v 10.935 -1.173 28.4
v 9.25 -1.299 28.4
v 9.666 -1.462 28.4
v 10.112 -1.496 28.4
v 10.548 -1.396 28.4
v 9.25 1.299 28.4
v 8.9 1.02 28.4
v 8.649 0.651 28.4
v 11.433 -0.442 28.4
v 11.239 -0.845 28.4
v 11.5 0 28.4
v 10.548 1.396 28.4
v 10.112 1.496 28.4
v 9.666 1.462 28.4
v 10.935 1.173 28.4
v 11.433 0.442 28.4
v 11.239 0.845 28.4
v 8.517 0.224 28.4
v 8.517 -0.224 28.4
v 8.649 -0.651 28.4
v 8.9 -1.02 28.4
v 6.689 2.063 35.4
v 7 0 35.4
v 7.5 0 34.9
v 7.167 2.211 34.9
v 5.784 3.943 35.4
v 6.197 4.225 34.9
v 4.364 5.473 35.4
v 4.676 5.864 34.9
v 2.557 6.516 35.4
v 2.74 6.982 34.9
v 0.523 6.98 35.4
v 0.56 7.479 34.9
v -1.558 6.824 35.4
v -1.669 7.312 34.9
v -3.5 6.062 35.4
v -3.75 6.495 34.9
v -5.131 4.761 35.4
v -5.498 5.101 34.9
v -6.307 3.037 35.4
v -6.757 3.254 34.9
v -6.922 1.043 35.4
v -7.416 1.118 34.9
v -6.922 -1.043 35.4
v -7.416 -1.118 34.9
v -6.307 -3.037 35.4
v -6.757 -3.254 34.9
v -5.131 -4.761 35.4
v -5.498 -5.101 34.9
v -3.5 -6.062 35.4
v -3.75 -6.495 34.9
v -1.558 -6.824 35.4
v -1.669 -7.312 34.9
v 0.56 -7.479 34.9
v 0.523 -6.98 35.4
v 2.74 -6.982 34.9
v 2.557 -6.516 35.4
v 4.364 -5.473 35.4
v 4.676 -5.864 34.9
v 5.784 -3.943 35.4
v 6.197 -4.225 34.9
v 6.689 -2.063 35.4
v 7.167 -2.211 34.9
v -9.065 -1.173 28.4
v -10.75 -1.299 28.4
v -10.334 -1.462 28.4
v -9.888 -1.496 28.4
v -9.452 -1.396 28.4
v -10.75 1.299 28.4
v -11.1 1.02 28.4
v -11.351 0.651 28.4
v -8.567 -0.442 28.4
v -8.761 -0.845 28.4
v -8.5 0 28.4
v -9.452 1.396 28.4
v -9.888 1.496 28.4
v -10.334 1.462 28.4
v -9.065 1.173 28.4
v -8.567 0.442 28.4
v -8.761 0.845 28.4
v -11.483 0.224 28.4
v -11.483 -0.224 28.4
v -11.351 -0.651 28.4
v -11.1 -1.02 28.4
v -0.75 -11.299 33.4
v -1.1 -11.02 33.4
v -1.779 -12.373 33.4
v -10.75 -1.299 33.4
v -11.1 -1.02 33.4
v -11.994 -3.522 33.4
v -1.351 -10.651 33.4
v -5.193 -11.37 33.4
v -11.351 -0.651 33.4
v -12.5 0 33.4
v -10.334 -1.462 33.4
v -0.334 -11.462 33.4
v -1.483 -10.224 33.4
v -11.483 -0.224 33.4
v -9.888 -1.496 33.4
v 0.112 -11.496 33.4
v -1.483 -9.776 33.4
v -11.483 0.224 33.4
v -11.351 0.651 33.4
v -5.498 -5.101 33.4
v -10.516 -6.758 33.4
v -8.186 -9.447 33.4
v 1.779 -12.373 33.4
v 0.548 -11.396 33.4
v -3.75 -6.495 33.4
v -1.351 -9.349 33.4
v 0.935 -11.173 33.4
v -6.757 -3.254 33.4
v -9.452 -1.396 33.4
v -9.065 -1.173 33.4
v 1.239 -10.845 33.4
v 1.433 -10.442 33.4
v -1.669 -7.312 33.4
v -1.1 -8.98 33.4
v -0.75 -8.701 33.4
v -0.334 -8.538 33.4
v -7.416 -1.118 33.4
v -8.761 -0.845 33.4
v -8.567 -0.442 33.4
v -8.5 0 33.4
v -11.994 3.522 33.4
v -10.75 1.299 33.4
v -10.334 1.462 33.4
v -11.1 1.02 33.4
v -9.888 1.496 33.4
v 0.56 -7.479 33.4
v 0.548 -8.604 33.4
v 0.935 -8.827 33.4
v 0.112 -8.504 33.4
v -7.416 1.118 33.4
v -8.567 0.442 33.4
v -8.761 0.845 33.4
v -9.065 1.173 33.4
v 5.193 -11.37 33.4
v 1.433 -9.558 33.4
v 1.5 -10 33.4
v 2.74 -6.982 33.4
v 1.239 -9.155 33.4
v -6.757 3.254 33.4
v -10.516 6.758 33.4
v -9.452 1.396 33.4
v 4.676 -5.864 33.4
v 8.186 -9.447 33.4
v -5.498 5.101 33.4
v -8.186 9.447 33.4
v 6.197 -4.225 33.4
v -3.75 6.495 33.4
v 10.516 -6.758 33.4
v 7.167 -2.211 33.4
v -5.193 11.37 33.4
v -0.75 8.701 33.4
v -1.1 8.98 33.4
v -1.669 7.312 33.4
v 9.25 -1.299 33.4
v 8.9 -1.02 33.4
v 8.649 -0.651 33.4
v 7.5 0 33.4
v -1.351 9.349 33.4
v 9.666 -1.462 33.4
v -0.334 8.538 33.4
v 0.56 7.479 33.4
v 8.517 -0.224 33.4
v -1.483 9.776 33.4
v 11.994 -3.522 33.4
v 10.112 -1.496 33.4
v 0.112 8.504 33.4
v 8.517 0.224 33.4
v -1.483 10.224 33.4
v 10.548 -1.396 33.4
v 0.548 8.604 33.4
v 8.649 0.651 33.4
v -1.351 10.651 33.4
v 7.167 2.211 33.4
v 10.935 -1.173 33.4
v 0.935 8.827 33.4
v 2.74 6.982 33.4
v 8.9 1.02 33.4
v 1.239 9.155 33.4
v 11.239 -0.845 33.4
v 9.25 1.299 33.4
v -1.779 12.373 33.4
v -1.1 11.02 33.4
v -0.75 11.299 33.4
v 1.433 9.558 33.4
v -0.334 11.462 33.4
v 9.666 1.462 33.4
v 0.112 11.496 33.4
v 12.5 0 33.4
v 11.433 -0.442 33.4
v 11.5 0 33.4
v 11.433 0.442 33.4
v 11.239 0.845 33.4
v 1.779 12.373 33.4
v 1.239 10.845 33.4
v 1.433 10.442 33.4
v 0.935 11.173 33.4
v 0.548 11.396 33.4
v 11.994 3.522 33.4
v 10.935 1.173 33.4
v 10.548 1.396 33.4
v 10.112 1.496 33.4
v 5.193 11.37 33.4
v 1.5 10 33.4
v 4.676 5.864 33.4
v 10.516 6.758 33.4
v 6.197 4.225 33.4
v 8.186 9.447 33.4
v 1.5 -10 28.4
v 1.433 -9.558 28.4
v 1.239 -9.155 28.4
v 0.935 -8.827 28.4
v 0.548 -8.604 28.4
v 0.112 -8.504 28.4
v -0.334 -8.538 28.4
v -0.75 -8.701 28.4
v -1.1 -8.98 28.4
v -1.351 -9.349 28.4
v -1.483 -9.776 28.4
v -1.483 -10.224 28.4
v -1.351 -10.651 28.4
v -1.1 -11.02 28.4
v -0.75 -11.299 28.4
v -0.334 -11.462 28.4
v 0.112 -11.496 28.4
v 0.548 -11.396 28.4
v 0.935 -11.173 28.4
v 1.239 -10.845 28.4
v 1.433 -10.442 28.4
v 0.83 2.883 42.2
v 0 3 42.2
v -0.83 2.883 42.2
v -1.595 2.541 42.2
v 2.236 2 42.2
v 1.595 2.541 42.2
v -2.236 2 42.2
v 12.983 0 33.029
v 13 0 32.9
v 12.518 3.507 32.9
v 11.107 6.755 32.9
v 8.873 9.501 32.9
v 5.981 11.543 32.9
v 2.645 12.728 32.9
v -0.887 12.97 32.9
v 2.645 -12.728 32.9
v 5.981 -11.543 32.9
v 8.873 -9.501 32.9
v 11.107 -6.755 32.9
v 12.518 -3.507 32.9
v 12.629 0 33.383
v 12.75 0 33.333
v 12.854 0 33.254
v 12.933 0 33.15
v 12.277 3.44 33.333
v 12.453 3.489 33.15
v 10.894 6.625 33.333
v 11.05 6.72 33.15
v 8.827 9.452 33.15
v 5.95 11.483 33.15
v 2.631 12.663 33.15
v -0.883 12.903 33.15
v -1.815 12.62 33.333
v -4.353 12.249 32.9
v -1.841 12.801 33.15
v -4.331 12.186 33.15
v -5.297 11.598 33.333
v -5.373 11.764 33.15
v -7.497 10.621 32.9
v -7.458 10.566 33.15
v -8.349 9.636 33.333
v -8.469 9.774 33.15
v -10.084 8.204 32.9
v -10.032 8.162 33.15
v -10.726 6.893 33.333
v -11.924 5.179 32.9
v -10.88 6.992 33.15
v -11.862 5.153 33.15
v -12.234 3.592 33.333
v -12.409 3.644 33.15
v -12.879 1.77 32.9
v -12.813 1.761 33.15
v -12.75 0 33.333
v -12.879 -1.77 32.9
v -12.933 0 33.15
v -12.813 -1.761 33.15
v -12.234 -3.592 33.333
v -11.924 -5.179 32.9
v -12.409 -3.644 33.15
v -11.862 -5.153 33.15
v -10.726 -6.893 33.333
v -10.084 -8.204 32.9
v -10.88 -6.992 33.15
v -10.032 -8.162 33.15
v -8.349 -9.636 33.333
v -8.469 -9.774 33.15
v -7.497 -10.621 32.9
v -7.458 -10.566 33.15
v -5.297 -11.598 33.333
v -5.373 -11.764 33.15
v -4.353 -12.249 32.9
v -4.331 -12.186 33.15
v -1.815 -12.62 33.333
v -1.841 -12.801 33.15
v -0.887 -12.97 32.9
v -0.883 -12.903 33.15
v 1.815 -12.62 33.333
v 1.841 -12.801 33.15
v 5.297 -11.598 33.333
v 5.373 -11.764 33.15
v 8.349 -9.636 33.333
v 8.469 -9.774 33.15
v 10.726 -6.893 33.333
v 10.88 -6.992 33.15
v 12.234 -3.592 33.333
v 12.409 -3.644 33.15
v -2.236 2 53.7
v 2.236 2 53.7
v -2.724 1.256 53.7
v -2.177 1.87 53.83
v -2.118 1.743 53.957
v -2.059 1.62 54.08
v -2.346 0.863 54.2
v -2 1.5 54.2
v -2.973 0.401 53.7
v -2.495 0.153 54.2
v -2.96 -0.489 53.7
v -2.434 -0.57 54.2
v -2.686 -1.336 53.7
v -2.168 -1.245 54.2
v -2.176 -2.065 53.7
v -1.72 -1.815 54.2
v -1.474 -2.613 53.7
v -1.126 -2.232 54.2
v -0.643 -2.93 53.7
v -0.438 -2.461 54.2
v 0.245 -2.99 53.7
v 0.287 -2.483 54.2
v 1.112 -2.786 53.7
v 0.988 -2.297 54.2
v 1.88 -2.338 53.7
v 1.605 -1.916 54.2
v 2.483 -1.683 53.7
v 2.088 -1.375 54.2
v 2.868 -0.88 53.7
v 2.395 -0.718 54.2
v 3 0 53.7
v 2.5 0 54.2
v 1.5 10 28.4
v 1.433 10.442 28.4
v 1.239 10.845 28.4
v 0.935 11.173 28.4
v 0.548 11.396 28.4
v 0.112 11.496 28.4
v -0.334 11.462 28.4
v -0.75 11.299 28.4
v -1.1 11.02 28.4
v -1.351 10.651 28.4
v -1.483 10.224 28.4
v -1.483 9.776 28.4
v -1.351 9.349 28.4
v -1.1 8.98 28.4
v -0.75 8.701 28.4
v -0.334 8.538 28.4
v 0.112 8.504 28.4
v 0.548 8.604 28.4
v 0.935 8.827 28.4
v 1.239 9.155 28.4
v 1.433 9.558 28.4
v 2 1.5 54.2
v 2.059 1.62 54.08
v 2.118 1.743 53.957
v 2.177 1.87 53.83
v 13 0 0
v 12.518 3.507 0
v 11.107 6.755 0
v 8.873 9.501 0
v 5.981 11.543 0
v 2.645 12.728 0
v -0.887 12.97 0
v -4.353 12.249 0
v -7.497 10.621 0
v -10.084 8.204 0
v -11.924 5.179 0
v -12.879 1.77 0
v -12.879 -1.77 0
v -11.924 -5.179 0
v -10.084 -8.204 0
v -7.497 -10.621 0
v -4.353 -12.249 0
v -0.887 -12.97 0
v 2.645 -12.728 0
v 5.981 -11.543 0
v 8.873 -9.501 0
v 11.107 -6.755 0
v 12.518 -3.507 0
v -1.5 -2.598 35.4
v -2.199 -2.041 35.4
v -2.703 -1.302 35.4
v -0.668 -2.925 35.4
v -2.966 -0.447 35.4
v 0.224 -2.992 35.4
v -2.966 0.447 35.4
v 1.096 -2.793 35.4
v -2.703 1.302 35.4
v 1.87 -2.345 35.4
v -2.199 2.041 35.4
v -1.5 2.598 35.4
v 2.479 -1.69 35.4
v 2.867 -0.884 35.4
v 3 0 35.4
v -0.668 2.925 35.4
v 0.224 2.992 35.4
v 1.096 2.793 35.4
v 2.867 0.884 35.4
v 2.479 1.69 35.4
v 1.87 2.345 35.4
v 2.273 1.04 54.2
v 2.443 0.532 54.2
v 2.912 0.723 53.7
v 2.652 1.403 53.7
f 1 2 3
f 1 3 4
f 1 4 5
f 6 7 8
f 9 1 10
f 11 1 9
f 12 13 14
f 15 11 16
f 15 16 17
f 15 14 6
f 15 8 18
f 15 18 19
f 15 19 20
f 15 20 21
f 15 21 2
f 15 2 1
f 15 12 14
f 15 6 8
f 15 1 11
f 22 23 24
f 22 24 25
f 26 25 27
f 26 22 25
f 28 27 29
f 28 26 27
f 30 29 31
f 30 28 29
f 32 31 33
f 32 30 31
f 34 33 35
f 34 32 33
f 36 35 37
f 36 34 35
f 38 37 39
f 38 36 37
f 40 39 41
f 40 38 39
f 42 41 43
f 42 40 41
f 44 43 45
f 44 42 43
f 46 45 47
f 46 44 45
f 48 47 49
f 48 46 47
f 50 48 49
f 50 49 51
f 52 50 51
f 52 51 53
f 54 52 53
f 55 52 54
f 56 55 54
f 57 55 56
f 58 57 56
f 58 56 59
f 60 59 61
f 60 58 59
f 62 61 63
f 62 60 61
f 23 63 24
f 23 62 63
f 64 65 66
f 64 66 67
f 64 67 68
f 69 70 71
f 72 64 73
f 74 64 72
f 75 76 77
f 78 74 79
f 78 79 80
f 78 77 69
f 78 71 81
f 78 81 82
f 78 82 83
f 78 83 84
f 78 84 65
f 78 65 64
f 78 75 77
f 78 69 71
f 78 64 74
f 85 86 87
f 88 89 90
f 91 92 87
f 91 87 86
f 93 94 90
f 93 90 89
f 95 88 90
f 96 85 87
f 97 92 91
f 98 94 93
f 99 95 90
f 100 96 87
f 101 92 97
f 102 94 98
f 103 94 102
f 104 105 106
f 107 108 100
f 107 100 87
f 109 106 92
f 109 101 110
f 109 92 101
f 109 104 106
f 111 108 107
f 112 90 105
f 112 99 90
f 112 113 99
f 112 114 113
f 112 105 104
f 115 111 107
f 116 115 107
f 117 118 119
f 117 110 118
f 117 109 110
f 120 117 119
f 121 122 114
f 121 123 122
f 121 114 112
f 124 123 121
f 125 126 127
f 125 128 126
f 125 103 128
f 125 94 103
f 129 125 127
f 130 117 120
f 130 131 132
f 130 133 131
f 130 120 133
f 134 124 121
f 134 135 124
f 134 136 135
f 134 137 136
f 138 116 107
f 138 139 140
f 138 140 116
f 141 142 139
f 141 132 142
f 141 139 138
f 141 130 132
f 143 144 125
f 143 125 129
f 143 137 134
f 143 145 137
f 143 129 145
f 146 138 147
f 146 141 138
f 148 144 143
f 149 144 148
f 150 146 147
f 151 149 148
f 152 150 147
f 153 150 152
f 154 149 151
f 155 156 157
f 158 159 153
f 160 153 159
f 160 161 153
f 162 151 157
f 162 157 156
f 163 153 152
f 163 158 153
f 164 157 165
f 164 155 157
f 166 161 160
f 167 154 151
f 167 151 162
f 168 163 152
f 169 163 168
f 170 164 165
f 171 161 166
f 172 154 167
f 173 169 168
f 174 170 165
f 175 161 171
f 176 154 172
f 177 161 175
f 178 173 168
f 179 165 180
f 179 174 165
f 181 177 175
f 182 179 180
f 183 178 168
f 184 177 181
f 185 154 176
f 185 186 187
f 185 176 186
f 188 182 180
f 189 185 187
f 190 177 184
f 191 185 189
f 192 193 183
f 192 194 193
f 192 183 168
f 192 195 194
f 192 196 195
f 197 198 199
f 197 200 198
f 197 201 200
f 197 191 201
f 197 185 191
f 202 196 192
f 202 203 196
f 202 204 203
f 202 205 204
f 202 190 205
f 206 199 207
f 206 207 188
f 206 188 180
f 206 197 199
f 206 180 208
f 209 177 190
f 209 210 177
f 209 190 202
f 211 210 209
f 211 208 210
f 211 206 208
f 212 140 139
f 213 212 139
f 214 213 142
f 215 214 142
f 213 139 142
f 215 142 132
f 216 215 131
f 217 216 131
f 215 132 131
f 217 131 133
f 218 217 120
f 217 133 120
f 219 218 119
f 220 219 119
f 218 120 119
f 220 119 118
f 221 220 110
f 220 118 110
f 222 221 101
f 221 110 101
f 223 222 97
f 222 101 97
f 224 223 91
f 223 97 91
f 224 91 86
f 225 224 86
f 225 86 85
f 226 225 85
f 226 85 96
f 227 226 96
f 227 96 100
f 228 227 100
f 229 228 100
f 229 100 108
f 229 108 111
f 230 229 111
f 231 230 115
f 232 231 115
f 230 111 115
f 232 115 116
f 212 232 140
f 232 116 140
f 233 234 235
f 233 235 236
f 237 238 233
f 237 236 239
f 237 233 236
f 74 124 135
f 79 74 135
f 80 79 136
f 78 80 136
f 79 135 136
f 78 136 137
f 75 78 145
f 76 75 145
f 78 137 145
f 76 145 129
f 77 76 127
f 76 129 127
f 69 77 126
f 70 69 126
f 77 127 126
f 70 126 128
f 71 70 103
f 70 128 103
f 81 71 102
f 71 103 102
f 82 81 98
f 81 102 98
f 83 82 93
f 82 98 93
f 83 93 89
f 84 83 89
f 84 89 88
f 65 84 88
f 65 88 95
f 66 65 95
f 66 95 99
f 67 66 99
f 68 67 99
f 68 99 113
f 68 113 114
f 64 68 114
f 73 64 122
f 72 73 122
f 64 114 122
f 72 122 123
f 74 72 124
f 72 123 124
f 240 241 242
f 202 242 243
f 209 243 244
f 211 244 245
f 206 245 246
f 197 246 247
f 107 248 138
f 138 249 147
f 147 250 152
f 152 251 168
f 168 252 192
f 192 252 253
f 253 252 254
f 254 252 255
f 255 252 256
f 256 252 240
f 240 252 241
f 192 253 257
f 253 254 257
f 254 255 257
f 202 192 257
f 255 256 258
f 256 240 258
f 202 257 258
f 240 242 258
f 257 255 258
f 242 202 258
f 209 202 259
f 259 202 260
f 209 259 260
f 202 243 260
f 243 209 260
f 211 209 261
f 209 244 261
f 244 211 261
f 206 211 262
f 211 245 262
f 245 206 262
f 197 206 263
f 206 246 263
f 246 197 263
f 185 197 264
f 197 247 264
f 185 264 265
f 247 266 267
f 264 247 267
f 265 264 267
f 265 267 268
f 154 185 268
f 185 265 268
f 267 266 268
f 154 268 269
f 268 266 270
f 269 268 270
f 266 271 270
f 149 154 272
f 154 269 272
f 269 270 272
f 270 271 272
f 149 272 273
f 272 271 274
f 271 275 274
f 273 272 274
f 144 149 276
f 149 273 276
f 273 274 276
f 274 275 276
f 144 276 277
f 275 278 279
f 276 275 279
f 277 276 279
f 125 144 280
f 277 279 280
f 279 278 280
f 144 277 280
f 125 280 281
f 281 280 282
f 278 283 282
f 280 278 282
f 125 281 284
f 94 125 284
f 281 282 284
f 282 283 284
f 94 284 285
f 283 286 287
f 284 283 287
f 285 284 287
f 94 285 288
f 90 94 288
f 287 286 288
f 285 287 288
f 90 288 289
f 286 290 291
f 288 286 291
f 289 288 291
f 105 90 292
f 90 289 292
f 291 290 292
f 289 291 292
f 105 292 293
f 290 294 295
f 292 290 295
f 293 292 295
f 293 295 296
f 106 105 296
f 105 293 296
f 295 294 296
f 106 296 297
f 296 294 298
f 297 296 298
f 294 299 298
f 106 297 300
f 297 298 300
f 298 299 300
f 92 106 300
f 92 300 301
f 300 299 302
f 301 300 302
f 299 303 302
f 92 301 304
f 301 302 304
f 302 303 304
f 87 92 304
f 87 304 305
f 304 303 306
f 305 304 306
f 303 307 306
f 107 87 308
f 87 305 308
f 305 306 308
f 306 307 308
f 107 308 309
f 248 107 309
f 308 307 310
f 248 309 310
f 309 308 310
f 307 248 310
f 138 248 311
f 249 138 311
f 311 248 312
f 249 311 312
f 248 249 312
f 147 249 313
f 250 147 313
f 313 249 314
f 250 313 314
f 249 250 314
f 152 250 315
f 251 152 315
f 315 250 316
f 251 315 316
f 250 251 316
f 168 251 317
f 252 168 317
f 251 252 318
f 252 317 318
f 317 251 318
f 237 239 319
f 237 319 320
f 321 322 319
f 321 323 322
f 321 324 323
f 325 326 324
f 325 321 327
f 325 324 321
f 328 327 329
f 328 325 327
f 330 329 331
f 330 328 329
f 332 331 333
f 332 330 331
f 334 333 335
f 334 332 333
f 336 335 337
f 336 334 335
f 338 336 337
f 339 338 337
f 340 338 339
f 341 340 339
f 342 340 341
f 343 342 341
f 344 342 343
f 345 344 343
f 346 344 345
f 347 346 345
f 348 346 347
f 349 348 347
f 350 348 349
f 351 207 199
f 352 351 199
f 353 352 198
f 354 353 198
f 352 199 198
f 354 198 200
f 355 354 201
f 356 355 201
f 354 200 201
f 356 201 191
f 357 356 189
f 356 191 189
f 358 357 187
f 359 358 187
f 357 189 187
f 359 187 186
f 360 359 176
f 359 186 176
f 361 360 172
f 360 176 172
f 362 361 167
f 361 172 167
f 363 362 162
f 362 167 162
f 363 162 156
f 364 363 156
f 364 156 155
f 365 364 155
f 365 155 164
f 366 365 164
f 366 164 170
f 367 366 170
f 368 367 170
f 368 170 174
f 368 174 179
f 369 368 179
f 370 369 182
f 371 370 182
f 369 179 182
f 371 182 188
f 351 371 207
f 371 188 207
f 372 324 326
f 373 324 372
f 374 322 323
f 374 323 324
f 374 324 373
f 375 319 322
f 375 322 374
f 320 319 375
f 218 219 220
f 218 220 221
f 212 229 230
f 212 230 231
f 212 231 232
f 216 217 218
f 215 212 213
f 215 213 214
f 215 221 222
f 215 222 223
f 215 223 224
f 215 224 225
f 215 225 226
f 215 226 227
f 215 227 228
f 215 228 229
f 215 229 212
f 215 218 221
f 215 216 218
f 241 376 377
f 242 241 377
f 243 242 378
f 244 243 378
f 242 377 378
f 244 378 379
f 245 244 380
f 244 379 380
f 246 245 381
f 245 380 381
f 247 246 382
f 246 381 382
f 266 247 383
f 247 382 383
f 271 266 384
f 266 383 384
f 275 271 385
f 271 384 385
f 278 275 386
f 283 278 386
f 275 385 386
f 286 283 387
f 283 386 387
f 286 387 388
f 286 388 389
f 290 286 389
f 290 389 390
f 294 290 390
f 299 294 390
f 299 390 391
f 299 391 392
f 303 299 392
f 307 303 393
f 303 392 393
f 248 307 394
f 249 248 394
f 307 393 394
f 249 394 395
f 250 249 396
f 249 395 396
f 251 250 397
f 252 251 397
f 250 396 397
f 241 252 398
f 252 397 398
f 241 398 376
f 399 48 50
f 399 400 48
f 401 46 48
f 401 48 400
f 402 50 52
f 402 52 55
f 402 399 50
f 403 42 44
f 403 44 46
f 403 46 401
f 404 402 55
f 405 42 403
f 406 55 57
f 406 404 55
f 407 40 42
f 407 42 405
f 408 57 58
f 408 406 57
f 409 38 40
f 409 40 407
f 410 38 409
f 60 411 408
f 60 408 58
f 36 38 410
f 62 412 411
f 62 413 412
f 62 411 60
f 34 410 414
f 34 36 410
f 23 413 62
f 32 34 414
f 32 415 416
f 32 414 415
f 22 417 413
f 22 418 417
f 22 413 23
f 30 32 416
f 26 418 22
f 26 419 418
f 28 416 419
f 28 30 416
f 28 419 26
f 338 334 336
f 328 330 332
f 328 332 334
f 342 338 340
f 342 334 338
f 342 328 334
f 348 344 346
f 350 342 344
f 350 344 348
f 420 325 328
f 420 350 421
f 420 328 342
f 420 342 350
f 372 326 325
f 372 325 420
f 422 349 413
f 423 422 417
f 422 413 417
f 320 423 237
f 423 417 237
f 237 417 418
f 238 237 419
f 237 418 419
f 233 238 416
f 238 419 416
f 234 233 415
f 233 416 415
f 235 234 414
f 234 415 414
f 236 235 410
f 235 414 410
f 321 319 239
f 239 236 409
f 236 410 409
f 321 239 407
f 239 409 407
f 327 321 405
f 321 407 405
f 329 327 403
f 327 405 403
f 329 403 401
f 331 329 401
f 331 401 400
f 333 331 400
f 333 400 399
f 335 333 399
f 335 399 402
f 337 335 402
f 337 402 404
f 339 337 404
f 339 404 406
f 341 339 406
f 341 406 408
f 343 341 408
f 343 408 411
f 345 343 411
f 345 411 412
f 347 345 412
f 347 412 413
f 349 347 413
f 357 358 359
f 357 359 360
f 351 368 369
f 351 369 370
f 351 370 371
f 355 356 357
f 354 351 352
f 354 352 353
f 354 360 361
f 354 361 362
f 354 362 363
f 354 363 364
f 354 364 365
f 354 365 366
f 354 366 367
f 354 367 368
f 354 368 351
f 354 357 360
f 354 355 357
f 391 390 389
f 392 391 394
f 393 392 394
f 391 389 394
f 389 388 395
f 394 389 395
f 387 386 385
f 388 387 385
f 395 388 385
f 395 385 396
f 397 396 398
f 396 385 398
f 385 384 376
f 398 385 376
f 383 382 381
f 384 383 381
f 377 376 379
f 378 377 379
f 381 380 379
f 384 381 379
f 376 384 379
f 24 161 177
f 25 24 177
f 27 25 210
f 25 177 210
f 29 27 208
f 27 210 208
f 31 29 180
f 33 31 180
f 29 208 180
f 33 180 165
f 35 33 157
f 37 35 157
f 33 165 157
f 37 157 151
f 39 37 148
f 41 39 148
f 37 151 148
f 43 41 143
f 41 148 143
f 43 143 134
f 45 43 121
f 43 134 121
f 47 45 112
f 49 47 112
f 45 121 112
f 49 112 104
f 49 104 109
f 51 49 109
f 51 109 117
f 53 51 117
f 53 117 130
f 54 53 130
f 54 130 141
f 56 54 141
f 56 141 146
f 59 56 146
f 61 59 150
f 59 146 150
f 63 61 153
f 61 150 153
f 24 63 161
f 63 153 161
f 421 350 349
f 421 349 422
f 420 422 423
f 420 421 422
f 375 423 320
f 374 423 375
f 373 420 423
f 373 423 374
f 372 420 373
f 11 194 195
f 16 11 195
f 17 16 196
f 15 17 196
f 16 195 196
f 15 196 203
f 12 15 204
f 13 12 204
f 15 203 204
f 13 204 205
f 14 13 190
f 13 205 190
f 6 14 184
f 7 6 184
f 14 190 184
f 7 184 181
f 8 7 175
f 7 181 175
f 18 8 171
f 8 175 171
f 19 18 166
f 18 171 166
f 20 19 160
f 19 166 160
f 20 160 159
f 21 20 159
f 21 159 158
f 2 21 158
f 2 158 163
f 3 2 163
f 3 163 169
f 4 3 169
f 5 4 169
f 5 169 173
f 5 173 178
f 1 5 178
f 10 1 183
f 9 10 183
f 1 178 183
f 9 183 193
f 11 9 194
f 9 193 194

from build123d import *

# Parameters (mm, degrees)
ESQUISSE1_R             = 13
BOSS_EXTRU_1_DEPTH      = 33.4
ESQUISSE2_R             = 7.5
BOSS_EXTRU_2_DEPTH      = 2
ESQUISSE3_R             = 3
BOSS_EXTRU_3_DEPTH      = 18.8
ENL_V_START             = -12
ENL_V_MAT_EXTRU_1_DEPTH = 12
CHANFREIN1_SIZE         = 0.5
ESQUISSE5_R             = 1.5
ENL_V_MAT_EXTRU_2_DEPTH = 5
CONG_1_R                = 0.5


with BuildPart() as part:
    # Esquisse1 → Boss.-Extru.1 (new body)
    with BuildSketch(Plane.XY):
        Circle(ESQUISSE1_R)
    extrude(amount=BOSS_EXTRU_1_DEPTH)

    # Esquisse2 → Boss.-Extru.2 (add)
    with BuildSketch(Plane.XY.offset(33.4)):
        Circle(ESQUISSE2_R)
    extrude(amount=BOSS_EXTRU_2_DEPTH)

    # Esquisse3 → Boss.-Extru.3 (add)
    with BuildSketch(Plane.XY.offset(35.4)):
        Circle(ESQUISSE3_R)
    extrude(amount=BOSS_EXTRU_3_DEPTH)

    # Esquisse4 → Enlèv. mat.-Extru.1 (cut)
    with BuildSketch(Plane.XY.offset(54.2).offset(ENL_V_START)):
        with BuildLine():
            Line((-2.236067977, 2), (2.236067977, 2))
            ThreePointArc((2.236067977, 2), (0, 3), (-2.236067977, 2))
        make_face()
    extrude(amount=ENL_V_MAT_EXTRU_1_DEPTH, mode=Mode.SUBTRACT)

    # Chanfrein1
    chanfrein1_edges = [part.edges().sort_by_distance(p)[0] for p in [
        (-1.070466269, -2.802517077, 54.2),
        (0, 2, 54.2),
        (-7.5, 0, 35.4),
    ]]
    chamfer(chanfrein1_edges, length=CHANFREIN1_SIZE)

    # Esquisse5 → Enlèv. mat.-Extru.2 (cut)
    with BuildSketch(Plane.XY.offset(33.4)):
        with Locations((0, 10)):
            Circle(ESQUISSE5_R)
        with Locations((10, 0)):
            Circle(ESQUISSE5_R)
        with Locations((0, -10)):
            Circle(ESQUISSE5_R)
        with Locations((-10, 0)):
            Circle(ESQUISSE5_R)
    extrude(amount=-ENL_V_MAT_EXTRU_2_DEPTH, mode=Mode.SUBTRACT)

    # Congé1
    cong_1_edges = [part.edges().sort_by_distance(p)[0] for p in [
        (-13, 0, 33.4),
    ]]
    fillet(cong_1_edges, radius=CONG_1_R)


solid = part.part
